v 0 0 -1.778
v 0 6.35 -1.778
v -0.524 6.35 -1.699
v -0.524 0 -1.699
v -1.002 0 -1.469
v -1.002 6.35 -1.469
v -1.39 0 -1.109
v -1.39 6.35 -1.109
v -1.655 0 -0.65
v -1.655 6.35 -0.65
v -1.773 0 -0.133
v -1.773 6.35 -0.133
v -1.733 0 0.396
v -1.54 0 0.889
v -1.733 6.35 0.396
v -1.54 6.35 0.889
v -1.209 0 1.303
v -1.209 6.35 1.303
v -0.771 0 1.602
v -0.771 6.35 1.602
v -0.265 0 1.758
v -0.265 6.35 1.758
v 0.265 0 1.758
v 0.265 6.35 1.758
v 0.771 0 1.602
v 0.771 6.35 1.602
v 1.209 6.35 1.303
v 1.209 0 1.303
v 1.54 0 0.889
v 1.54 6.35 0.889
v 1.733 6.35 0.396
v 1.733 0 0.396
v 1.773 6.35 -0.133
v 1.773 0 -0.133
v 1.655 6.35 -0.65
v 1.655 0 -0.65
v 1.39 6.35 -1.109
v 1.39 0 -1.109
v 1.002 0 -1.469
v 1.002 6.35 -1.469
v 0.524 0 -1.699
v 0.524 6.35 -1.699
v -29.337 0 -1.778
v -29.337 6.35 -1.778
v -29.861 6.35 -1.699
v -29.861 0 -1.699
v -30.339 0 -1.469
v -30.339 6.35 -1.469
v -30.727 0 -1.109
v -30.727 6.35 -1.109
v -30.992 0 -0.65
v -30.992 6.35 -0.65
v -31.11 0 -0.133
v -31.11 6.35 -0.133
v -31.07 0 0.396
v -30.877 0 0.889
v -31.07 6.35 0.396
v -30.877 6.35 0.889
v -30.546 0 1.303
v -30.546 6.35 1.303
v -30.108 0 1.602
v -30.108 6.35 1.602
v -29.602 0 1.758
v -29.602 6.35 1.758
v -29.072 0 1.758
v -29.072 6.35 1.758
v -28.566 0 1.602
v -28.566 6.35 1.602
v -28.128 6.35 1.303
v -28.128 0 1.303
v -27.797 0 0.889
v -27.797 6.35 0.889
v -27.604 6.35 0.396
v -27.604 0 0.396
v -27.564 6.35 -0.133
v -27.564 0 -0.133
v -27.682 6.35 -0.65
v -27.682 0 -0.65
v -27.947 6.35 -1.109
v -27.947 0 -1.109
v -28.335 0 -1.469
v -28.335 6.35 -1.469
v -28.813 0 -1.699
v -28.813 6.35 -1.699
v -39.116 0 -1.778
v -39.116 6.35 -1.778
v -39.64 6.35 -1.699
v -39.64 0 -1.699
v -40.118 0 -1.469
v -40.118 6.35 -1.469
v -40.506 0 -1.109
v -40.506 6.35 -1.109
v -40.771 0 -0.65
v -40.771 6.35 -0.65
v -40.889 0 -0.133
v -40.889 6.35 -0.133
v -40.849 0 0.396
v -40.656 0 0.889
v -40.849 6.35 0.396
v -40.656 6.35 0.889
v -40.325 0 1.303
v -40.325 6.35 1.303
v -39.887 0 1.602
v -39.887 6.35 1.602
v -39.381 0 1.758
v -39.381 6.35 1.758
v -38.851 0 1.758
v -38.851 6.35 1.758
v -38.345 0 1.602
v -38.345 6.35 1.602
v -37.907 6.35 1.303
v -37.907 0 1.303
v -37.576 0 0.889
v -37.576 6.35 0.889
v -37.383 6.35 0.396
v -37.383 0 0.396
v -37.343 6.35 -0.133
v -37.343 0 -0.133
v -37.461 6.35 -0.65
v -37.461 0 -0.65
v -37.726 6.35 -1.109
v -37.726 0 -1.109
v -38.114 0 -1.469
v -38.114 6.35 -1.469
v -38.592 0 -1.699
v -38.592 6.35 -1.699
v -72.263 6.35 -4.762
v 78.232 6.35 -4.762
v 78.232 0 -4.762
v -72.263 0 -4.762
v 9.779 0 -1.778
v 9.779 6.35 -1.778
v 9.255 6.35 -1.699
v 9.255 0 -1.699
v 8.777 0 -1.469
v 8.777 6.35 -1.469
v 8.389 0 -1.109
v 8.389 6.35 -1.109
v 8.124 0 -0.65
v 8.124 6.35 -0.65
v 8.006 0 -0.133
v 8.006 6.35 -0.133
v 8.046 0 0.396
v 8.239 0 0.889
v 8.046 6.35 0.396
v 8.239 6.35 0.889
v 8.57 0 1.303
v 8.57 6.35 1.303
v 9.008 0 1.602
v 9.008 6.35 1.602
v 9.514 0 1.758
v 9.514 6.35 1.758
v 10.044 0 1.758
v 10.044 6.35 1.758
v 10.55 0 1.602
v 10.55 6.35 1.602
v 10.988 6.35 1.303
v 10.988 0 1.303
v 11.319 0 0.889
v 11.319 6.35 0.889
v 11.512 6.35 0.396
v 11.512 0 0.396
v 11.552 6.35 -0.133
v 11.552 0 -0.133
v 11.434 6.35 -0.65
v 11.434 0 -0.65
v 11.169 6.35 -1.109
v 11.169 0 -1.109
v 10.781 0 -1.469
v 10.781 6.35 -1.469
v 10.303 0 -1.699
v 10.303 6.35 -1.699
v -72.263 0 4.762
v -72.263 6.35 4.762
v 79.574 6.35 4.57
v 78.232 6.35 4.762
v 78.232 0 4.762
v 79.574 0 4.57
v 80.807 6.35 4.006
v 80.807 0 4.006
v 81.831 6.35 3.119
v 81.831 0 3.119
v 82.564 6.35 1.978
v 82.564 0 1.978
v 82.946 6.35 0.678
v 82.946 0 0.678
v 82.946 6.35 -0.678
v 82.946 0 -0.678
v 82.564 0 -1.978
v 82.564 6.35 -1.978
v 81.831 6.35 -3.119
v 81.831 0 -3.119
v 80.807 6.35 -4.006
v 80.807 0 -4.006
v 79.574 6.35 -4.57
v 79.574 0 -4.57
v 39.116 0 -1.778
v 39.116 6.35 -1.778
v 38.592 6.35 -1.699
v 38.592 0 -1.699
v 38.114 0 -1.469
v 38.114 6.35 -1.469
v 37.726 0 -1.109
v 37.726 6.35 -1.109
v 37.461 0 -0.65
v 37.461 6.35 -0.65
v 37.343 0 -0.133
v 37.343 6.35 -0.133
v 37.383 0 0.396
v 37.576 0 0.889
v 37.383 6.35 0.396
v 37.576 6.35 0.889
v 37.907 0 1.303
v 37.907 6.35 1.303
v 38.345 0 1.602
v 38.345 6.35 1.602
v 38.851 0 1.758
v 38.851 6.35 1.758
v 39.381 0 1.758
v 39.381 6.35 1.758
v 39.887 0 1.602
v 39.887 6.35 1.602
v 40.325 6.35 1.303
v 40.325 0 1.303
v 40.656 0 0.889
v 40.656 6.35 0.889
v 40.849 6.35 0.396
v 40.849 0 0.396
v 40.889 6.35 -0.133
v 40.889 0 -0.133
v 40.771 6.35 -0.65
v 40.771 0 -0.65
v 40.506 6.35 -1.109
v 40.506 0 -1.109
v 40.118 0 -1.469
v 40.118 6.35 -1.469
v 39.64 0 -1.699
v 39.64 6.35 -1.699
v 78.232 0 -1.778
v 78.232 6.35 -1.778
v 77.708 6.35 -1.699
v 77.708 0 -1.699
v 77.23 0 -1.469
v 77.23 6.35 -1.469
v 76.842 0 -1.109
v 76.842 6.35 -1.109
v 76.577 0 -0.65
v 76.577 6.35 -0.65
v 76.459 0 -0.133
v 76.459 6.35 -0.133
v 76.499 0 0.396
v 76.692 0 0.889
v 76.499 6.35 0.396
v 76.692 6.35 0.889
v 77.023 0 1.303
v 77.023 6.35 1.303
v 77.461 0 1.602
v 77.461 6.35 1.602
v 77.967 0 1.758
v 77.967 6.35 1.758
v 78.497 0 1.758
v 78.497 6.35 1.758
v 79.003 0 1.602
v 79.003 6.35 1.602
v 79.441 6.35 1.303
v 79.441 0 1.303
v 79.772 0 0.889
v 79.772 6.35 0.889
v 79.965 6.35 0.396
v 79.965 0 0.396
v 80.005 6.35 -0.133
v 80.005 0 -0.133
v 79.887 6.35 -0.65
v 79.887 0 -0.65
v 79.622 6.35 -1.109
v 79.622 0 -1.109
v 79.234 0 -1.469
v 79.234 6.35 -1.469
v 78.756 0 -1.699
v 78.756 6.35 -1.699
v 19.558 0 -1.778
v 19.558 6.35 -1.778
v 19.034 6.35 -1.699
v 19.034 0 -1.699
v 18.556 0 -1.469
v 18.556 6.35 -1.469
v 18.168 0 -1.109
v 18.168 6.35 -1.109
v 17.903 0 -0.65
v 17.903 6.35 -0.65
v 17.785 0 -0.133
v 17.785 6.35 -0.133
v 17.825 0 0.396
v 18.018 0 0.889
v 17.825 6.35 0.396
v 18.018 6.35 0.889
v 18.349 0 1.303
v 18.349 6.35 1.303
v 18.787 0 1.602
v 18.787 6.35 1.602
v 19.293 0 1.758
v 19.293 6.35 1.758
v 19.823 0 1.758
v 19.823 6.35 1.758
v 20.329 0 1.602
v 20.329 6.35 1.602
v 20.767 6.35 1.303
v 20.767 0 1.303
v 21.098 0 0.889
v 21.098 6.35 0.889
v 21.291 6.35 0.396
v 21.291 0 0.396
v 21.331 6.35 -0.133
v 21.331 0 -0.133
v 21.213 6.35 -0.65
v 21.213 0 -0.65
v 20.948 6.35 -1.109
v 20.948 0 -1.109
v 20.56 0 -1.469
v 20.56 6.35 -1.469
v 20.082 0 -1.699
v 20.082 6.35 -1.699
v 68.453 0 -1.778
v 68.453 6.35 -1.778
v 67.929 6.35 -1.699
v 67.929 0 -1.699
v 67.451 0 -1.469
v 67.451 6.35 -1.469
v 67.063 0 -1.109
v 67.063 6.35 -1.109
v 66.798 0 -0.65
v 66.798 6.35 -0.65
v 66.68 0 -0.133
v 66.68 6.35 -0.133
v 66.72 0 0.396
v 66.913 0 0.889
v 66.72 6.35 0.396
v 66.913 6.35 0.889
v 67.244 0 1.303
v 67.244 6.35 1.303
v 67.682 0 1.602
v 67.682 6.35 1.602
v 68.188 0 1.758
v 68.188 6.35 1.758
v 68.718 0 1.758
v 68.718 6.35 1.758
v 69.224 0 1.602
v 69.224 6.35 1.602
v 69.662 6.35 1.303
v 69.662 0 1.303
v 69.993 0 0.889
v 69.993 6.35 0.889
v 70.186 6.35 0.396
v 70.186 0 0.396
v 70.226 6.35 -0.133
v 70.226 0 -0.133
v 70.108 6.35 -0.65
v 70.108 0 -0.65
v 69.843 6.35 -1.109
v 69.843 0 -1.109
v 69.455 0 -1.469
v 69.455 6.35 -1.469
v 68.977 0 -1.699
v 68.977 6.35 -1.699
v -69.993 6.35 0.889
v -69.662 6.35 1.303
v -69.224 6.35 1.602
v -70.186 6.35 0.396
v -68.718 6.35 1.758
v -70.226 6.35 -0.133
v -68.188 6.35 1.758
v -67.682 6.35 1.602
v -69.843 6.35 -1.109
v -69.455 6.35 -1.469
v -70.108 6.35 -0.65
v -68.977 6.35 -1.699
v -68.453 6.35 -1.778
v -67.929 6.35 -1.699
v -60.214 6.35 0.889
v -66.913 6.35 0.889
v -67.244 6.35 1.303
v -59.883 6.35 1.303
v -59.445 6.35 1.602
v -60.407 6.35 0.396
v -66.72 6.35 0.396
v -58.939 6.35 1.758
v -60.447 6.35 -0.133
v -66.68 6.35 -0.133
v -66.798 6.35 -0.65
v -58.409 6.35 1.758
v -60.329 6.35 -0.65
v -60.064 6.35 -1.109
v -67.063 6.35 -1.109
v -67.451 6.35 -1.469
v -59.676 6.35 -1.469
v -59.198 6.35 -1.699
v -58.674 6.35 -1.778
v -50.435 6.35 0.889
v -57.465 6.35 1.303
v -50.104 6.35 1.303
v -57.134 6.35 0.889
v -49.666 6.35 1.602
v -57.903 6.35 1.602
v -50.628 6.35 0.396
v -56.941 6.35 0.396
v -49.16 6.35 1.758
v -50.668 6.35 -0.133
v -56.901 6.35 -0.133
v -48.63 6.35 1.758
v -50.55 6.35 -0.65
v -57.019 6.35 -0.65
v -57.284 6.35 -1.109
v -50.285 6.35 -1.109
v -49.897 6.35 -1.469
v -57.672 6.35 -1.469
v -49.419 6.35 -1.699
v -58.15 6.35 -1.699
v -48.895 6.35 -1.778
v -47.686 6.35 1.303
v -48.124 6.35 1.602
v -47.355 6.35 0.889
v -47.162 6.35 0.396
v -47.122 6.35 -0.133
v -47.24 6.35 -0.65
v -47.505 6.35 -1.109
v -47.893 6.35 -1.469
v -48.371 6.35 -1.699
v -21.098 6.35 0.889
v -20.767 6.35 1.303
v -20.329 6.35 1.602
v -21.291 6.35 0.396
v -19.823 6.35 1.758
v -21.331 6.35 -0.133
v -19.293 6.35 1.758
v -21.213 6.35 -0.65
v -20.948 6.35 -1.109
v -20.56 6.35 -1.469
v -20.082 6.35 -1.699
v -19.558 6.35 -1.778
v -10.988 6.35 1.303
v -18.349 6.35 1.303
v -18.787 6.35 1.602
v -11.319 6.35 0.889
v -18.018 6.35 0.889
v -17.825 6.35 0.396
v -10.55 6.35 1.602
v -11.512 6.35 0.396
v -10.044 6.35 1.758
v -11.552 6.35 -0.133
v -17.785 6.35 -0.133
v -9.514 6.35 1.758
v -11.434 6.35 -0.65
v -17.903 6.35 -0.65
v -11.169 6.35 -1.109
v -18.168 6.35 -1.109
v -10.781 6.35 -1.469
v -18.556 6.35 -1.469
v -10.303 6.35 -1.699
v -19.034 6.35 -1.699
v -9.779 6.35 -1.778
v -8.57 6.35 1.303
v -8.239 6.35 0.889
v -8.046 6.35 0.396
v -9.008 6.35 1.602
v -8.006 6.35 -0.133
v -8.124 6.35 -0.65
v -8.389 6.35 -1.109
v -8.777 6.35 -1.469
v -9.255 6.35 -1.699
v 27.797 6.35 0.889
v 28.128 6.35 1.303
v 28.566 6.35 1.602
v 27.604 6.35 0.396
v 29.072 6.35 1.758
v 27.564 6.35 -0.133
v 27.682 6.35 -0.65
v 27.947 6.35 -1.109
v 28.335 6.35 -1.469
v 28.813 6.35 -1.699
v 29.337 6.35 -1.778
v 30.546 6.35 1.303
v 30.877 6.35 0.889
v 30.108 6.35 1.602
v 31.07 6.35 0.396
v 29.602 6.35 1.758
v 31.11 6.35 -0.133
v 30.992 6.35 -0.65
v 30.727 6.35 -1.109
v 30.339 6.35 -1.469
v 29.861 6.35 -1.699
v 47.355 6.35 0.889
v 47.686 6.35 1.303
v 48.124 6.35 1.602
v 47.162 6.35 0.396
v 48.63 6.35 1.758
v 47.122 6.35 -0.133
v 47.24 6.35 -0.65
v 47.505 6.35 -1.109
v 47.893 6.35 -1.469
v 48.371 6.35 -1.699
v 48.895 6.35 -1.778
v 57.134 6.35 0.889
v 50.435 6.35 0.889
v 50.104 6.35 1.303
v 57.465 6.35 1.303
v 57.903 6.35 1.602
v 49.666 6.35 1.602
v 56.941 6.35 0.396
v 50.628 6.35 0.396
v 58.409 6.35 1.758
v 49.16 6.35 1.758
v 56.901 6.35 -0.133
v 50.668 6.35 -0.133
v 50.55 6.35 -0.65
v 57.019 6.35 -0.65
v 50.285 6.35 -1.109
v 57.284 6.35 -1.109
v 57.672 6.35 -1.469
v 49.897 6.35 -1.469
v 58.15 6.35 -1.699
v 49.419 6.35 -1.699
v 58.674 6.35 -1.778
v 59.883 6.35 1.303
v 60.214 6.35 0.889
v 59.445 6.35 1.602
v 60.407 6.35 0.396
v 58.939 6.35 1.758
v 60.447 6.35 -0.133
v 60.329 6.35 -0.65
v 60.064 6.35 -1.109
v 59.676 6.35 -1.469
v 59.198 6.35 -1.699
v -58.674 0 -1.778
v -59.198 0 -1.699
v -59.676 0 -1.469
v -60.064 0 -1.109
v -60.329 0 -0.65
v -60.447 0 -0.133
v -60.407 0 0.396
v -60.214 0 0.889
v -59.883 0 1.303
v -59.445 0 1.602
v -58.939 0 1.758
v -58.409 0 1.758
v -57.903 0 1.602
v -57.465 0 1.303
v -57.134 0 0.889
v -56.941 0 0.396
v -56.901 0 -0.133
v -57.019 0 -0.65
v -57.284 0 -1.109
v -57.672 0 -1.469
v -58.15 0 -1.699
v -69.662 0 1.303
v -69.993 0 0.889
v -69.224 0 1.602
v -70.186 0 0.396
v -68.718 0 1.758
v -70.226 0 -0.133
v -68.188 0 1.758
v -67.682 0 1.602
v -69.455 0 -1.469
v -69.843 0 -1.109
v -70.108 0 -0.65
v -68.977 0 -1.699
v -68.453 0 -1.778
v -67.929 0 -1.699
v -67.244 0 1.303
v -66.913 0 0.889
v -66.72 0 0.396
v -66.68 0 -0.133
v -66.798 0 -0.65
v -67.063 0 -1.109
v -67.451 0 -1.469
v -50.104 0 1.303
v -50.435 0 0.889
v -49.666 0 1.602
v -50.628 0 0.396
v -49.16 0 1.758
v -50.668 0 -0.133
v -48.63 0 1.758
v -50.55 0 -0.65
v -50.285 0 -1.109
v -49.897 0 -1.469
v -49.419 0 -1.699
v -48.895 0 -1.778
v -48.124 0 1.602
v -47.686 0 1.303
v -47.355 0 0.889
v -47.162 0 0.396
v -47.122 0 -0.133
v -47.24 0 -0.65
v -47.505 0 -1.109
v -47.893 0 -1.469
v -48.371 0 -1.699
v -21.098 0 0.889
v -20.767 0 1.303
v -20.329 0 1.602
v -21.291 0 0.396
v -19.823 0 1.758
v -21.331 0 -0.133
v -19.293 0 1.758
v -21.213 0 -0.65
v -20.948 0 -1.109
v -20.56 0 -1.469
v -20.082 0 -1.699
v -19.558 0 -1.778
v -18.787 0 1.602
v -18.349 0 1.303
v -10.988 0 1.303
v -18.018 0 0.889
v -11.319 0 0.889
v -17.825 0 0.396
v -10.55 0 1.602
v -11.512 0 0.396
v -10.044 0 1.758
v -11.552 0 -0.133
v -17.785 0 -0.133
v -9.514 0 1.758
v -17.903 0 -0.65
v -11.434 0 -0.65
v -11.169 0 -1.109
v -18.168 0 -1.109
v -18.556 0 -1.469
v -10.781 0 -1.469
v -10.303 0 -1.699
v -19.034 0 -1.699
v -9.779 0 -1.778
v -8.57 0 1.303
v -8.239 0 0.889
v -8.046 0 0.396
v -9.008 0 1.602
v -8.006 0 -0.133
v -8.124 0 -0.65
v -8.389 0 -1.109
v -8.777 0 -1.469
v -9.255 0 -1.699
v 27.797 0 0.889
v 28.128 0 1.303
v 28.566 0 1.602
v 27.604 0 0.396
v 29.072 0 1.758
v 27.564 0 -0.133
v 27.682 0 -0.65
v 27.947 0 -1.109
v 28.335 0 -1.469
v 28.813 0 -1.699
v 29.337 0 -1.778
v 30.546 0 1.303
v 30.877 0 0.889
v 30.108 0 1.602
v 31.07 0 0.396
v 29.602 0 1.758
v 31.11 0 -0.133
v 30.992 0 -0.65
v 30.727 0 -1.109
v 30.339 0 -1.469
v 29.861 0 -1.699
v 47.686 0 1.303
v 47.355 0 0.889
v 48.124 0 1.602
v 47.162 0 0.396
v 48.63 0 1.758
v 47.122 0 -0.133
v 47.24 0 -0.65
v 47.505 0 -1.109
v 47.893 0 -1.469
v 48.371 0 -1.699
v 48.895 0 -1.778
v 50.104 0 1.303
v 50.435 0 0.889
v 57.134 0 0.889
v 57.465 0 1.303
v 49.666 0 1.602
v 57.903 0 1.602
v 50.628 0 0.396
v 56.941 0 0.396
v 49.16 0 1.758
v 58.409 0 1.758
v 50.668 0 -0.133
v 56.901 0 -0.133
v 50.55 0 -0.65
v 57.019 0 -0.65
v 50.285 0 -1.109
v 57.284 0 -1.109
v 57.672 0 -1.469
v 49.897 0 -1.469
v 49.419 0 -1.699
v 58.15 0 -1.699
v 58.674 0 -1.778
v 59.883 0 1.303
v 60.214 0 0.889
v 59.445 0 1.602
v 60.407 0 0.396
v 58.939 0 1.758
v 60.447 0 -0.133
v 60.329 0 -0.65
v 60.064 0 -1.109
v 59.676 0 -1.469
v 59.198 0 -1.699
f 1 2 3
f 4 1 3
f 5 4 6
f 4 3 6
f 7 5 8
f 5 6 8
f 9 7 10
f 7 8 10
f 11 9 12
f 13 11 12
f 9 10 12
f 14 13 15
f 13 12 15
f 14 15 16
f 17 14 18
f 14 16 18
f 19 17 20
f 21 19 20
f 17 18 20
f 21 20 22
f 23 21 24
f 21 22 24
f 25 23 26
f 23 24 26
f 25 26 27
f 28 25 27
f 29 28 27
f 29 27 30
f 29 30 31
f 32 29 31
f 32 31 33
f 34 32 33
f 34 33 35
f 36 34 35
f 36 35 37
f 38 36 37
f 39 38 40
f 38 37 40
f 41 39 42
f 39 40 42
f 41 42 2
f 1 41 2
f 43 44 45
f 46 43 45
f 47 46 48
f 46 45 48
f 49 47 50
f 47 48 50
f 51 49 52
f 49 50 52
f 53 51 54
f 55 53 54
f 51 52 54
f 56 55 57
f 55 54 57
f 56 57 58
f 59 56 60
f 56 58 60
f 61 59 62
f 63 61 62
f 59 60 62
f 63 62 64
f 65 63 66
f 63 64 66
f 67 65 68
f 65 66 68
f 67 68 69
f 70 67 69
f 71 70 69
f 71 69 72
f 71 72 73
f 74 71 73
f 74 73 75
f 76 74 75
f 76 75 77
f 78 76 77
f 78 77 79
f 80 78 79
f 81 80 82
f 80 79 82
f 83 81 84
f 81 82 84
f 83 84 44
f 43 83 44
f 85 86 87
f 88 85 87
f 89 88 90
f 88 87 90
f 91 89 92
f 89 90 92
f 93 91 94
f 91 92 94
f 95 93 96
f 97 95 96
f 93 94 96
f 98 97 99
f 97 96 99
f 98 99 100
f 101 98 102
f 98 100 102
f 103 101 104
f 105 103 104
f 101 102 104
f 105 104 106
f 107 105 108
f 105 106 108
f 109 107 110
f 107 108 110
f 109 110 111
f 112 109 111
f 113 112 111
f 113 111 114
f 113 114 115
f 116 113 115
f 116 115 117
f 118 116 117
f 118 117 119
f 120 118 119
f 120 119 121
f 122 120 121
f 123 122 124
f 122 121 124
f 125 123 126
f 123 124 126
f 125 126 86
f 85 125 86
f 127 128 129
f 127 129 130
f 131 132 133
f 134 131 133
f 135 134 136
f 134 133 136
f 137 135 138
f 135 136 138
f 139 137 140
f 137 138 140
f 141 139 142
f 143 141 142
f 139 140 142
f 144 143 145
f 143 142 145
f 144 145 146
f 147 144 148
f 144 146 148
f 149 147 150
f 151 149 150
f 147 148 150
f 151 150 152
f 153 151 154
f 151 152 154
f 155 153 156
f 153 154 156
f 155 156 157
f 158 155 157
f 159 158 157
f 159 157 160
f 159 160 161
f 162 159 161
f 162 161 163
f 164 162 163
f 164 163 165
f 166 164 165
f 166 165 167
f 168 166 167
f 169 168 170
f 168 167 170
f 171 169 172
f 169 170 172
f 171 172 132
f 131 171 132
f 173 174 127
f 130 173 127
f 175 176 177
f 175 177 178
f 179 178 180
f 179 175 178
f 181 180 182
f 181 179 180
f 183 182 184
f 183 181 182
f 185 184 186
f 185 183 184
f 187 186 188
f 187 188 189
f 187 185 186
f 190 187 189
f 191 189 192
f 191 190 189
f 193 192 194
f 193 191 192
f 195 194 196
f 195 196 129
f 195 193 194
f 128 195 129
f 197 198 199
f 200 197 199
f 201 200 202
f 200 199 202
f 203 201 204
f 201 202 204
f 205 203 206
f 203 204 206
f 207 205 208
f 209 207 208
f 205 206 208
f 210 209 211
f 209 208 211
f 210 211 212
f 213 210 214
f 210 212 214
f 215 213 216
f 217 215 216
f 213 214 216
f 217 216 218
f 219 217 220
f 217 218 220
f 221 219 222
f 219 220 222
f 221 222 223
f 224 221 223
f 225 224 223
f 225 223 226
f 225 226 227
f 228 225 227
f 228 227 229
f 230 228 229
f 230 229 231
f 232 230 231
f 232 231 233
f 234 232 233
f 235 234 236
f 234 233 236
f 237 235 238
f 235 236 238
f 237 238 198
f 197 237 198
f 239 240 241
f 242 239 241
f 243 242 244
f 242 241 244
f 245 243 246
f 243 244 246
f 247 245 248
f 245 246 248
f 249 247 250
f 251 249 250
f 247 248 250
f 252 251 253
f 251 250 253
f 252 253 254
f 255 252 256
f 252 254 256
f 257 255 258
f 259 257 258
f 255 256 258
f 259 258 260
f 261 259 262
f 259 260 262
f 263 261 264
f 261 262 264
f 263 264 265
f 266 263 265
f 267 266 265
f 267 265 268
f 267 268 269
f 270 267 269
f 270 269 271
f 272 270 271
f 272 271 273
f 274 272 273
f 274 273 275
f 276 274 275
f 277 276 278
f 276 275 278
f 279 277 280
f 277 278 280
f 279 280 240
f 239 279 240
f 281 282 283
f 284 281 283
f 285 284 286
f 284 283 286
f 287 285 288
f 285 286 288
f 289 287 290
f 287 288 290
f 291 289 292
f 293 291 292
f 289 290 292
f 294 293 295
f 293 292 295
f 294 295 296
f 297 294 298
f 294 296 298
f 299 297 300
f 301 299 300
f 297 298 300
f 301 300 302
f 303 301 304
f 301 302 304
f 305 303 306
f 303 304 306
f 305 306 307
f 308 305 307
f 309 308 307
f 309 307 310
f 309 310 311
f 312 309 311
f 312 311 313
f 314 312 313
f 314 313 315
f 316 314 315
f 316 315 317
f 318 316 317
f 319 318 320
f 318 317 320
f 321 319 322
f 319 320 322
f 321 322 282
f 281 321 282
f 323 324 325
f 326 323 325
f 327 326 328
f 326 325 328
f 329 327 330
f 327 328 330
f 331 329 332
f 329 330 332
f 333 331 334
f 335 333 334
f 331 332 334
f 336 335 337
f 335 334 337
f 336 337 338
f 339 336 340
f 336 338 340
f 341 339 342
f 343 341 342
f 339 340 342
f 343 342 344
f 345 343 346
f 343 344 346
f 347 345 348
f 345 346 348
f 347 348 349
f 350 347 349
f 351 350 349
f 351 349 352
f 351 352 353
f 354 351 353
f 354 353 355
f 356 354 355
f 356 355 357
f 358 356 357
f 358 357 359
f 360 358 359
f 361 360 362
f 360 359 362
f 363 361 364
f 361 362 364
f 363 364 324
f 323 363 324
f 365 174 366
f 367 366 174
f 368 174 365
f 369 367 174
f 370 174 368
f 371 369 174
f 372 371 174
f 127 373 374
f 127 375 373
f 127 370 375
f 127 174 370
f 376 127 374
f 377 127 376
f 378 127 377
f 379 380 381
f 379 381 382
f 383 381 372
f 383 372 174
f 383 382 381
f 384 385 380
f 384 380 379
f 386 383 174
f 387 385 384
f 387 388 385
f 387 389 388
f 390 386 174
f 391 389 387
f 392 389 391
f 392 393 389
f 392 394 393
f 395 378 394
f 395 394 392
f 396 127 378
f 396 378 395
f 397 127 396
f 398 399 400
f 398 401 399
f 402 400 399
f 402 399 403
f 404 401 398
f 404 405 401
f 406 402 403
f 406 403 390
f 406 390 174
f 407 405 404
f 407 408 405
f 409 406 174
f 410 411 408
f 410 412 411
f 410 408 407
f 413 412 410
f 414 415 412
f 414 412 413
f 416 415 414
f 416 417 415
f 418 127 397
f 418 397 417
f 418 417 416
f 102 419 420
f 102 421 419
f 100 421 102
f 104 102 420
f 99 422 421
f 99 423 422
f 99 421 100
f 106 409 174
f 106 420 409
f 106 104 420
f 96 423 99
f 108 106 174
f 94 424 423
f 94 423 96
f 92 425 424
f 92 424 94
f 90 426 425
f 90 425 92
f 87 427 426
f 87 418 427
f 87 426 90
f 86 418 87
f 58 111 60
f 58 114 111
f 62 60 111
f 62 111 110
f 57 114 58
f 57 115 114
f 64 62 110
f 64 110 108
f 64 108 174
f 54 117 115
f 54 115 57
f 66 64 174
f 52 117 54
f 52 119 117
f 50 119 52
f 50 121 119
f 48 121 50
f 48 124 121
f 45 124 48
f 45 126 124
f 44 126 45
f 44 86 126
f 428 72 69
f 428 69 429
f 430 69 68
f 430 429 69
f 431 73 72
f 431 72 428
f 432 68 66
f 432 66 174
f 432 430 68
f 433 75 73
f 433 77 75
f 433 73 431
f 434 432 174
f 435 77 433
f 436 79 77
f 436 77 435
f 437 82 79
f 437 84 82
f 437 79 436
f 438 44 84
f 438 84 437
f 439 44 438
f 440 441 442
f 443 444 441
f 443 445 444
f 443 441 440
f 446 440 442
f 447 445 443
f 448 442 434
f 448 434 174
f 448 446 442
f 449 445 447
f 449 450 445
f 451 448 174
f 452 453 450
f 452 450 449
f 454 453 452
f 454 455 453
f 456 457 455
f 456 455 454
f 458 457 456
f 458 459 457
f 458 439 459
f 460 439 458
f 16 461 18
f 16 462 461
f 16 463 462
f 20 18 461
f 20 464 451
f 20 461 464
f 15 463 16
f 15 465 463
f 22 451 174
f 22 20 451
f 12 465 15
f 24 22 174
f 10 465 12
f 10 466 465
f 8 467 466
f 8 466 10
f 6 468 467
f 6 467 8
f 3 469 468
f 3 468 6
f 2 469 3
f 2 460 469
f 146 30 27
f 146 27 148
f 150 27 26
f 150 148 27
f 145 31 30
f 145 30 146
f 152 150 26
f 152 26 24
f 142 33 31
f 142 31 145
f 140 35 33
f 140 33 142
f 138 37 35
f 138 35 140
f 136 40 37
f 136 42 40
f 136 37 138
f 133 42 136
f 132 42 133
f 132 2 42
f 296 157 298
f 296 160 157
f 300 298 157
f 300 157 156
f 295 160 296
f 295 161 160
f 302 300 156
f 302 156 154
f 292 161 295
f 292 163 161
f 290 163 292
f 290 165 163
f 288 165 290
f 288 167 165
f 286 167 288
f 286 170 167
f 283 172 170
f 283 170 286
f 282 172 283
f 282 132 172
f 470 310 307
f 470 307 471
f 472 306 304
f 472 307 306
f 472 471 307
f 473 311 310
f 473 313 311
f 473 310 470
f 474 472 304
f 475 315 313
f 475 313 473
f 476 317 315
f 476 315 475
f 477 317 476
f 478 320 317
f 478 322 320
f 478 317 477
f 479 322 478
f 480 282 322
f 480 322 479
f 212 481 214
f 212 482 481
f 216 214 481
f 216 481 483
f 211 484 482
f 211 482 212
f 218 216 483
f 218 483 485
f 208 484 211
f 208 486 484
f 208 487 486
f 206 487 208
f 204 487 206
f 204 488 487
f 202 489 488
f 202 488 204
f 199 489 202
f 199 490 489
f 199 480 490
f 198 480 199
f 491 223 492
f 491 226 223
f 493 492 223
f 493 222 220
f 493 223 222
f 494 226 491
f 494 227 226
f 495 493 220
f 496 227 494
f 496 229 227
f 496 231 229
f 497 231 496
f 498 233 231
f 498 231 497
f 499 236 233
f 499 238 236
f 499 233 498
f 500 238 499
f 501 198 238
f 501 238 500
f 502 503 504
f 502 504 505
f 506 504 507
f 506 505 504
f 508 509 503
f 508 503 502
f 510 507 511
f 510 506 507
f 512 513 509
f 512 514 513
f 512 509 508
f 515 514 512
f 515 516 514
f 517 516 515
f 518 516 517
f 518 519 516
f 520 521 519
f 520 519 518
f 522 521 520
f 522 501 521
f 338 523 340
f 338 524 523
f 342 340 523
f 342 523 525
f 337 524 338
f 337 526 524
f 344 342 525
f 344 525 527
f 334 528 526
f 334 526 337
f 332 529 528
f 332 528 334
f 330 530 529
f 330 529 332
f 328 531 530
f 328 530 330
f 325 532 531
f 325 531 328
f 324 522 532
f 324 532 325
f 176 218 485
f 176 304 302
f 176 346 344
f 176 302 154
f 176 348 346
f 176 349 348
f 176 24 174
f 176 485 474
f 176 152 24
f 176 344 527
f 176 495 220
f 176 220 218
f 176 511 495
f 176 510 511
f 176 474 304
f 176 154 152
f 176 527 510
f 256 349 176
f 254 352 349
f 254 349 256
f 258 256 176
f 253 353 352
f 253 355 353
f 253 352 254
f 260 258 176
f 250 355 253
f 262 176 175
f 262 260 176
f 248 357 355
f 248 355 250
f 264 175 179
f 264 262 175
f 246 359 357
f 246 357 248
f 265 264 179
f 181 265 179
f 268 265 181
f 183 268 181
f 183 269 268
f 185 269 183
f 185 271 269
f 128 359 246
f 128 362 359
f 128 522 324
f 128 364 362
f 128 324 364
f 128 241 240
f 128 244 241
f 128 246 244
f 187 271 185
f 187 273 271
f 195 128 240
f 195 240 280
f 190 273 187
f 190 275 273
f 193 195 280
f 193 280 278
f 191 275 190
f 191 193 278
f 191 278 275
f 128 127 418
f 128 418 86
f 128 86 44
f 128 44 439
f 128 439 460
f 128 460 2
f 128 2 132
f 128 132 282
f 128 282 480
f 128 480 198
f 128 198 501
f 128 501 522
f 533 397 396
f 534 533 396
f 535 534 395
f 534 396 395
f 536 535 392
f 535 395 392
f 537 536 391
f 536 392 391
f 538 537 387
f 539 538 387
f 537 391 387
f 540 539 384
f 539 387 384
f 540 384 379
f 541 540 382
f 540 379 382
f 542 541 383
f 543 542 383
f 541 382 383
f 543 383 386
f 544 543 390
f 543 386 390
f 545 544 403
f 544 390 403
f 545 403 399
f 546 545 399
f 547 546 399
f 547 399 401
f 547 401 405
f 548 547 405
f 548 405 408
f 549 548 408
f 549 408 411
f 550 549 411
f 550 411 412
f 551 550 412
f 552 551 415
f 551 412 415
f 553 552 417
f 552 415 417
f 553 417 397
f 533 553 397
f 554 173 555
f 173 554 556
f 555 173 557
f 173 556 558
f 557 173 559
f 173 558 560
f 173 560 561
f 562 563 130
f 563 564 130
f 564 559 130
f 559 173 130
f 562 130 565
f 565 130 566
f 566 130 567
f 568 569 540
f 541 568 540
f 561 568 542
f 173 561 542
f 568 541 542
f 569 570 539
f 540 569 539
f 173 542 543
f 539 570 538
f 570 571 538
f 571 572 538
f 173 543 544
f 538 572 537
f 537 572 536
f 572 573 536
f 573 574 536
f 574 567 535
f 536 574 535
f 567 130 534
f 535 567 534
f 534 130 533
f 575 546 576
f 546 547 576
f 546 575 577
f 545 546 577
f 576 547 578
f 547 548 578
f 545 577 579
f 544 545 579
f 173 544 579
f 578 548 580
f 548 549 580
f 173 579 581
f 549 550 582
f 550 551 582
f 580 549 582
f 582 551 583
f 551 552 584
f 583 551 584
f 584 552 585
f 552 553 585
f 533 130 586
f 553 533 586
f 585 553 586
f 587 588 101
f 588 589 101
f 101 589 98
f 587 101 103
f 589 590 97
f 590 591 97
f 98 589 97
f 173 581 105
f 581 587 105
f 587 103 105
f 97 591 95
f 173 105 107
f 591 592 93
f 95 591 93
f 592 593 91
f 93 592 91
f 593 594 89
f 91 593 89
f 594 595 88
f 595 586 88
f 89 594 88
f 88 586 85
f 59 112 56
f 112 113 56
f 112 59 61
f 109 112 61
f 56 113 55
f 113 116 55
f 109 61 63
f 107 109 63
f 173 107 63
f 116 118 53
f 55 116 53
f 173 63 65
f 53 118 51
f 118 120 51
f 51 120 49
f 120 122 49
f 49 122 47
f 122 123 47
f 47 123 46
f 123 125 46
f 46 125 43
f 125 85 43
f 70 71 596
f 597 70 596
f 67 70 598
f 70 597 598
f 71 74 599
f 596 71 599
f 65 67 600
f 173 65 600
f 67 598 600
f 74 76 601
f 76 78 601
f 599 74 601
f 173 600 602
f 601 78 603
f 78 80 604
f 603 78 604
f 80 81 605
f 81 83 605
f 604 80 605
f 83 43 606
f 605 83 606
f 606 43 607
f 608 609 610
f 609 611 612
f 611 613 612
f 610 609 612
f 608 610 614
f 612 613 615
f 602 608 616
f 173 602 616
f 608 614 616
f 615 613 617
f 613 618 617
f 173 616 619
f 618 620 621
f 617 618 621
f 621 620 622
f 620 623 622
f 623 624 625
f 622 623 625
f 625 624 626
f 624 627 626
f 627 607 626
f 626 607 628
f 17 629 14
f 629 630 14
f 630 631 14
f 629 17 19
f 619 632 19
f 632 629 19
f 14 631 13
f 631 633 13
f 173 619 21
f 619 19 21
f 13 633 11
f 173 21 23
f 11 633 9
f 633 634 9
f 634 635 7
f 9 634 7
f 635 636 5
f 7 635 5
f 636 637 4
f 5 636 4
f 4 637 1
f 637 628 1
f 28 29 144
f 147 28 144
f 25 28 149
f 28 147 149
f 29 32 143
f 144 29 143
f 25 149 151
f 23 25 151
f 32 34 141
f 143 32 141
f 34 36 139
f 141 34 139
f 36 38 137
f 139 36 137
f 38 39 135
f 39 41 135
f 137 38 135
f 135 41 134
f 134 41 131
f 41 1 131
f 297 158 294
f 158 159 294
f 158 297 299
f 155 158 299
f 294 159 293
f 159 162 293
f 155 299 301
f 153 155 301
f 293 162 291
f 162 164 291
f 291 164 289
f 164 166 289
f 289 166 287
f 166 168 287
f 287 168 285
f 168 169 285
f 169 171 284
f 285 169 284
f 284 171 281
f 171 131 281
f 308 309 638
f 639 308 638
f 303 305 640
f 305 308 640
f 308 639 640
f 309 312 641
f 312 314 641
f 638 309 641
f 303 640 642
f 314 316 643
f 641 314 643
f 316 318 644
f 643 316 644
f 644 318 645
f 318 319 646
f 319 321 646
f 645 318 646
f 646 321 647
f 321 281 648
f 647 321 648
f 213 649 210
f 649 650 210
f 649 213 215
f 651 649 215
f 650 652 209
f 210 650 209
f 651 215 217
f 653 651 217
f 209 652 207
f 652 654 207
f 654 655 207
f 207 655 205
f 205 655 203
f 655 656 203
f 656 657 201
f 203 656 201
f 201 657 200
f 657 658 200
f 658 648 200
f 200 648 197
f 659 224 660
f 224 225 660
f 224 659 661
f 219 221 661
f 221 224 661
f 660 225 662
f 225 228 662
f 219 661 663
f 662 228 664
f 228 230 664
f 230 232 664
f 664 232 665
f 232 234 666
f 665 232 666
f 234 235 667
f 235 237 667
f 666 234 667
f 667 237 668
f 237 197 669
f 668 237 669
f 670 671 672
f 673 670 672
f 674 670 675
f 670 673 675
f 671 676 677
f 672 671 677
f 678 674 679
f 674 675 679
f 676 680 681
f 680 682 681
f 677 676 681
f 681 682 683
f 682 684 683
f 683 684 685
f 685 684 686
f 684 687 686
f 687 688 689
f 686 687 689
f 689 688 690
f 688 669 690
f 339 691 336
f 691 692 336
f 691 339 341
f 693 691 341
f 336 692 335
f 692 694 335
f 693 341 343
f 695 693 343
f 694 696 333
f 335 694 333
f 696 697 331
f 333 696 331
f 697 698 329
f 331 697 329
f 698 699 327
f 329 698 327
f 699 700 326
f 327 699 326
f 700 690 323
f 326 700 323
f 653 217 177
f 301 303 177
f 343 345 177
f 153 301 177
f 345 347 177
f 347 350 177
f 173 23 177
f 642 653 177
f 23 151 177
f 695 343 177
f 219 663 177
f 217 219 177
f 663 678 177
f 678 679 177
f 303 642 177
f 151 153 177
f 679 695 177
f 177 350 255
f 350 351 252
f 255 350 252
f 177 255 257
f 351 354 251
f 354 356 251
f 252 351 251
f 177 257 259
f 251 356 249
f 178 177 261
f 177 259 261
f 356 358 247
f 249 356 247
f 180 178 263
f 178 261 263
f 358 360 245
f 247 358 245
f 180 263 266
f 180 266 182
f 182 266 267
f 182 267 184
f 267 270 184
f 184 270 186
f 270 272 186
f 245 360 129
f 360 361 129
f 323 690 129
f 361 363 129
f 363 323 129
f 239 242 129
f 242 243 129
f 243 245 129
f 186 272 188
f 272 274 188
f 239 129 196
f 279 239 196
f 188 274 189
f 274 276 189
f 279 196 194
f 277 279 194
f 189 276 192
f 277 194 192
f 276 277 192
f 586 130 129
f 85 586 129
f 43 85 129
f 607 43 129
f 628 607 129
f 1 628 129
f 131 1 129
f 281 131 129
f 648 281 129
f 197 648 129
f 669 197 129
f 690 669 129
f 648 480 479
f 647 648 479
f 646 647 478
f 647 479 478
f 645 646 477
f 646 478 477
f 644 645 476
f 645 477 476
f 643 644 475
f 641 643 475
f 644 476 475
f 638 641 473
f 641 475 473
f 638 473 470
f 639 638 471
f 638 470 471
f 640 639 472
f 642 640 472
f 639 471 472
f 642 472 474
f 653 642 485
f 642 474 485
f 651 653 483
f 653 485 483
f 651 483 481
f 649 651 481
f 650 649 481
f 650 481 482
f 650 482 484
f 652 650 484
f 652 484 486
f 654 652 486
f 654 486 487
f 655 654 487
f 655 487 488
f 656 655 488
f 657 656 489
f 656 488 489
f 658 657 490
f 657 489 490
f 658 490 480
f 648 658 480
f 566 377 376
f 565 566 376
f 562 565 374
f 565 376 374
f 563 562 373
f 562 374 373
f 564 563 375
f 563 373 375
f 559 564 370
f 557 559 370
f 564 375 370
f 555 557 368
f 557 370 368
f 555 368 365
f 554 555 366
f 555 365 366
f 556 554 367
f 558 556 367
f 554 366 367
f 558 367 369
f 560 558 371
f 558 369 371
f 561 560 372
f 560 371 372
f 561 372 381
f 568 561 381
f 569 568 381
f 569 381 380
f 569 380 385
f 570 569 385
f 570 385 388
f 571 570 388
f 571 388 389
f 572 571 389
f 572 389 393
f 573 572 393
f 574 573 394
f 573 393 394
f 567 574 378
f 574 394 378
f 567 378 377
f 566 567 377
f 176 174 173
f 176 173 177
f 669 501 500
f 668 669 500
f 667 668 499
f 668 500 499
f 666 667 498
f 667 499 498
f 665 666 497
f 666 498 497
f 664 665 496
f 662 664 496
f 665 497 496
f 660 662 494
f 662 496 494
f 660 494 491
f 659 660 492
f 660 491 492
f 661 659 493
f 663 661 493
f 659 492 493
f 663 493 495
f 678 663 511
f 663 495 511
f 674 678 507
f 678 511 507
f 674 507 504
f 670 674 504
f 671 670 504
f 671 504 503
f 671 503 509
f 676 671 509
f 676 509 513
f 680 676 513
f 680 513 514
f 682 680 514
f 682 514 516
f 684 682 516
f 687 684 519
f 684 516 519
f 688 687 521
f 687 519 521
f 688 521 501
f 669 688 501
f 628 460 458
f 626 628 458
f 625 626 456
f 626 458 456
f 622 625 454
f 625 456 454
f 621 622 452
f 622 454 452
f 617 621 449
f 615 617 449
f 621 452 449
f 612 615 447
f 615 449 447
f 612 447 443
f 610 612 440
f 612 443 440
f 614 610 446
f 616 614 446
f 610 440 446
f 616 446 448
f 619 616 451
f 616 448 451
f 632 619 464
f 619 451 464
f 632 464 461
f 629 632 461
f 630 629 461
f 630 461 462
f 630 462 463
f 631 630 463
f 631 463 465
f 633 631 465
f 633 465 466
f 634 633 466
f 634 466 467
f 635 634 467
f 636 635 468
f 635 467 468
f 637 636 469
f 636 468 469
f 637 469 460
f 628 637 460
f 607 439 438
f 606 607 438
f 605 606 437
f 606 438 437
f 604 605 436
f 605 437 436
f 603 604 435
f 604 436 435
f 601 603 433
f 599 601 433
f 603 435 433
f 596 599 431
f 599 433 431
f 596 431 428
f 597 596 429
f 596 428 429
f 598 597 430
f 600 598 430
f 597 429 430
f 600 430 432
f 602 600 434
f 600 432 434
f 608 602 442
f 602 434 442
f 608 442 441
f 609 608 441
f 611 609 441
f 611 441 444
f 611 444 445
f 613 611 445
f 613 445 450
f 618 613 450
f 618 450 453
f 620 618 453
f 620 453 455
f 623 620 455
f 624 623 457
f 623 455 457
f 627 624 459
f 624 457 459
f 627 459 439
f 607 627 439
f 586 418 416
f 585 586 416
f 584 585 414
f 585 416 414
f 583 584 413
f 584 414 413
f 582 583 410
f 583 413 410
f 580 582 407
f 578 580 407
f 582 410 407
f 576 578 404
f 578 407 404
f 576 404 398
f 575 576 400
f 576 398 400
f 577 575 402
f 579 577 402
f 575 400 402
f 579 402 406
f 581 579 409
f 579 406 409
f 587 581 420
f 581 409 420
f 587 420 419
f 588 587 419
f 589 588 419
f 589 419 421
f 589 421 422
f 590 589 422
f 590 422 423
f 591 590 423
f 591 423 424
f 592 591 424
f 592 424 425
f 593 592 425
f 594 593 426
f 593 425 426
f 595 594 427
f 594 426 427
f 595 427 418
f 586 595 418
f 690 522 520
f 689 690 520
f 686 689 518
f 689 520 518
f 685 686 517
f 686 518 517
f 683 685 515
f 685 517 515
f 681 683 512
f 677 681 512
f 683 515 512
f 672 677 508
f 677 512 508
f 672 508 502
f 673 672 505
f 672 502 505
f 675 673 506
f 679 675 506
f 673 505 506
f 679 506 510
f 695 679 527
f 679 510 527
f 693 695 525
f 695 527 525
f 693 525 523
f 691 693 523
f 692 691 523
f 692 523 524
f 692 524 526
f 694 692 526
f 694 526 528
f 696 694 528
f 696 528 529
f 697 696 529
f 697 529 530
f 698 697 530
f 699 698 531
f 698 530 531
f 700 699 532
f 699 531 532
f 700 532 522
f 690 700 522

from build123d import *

# Parameters (mm, degrees)
SKETCH1_R           = 1.778
BOSS_EXTRUDE1_DEPTH = 6.35
SKETCH2_W           = 10.758447183
SKETCH2_H           = 9.8425
CUT_EXTRUDE1_DEPTH  = 84.373202748


with BuildPart() as part:
    # Sketch1 → Boss-Extrude1 (new body)
    with BuildSketch(Plane(origin=(0, 6.35, 0), x_dir=(1, 0, 0), z_dir=(0, 1, 0))):
        with BuildLine():
            Line((78.232, 4.7625), (-78.232, 4.7625))
            ThreePointArc((-78.232, 4.7625), (-82.9945, 0), (-78.232, -4.7625))
            Line((-78.232, -4.7625), (78.232, -4.7625))
            ThreePointArc((78.232, -4.7625), (82.9945, 0), (78.232, 4.7625))
        make_face()
        with Locations(Location((78.232, 0, 0), (0, 0, 90))):
            Circle(SKETCH1_R, mode=Mode.SUBTRACT)
        with Locations(Location((68.453, 0, 0), (0, 0, 90))):
            Circle(SKETCH1_R, mode=Mode.SUBTRACT)
        with Locations(Location((58.674, 0, 0), (0, 0, 90))):
            Circle(SKETCH1_R, mode=Mode.SUBTRACT)
        with Locations(Location((48.895, 0, 0), (0, 0, 90))):
            Circle(SKETCH1_R, mode=Mode.SUBTRACT)
        with Locations(Location((39.116, 0, 0), (0, 0, 90))):
            Circle(SKETCH1_R, mode=Mode.SUBTRACT)
        with Locations(Location((29.337, 0, 0), (0, 0, 90))):
            Circle(SKETCH1_R, mode=Mode.SUBTRACT)
        with Locations(Location((19.558, 0, 0), (0, 0, 90))):
            Circle(SKETCH1_R, mode=Mode.SUBTRACT)
        with Locations(Location((9.779, 0, 0), (0, 0, 90))):
            Circle(SKETCH1_R, mode=Mode.SUBTRACT)
        with Locations(Location((0, 0, 0), (0, 0, 90))):
            Circle(SKETCH1_R, mode=Mode.SUBTRACT)
        with Locations(Location((-9.779, 0, 0), (0, 0, 90))):
            Circle(SKETCH1_R, mode=Mode.SUBTRACT)
        with Locations(Location((-19.558, 0, 0), (0, 0, 90))):
            Circle(SKETCH1_R, mode=Mode.SUBTRACT)
        with Locations(Location((-29.337, 0, 0), (0, 0, 90))):
            Circle(SKETCH1_R, mode=Mode.SUBTRACT)
        with Locations(Location((-39.116, 0, 0), (0, 0, 90))):
            Circle(SKETCH1_R, mode=Mode.SUBTRACT)
        with Locations(Location((-48.895, 0, 0), (0, 0, 90))):
            Circle(SKETCH1_R, mode=Mode.SUBTRACT)
        with Locations(Location((-58.674, 0, 0), (0, 0, 90))):
            Circle(SKETCH1_R, mode=Mode.SUBTRACT)
        with Locations(Location((-68.453, 0, 0), (0, 0, 90))):
            Circle(SKETCH1_R, mode=Mode.SUBTRACT)
        with Locations(Location((-78.232, 0, 0), (0, 0, 90))):
            Circle(SKETCH1_R, mode=Mode.SUBTRACT)
    extrude(amount=-BOSS_EXTRUDE1_DEPTH)

    # Sketch2 → Cut-Extrude1 (cut, through all)
    with BuildSketch(Plane(origin=(0, 6.35, 0), x_dir=(1, 0, 0), z_dir=(0, 1, 0))):
        with Locations((-77.642223591, 0.15875)):
            Rectangle(SKETCH2_W, SKETCH2_H)
    extrude(amount=-CUT_EXTRUDE1_DEPTH, mode=Mode.SUBTRACT)


solid = part.part
